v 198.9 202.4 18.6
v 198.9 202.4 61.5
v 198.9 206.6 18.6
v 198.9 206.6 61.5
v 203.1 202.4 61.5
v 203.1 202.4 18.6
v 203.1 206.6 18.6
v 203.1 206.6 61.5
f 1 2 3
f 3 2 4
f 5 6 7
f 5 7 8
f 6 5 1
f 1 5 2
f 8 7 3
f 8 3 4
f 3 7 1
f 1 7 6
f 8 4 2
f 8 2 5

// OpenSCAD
// Generated by the canonical parent Python sources and validated exchange pipeline.
polyhedron(points=[[198.89999389648438, 202.39999389648438, 18.600000381469727], [198.89999389648438, 202.39999389648438, 61.5], [198.89999389648438, 206.60000610351562, 18.600000381469727], [198.89999389648438, 206.60000610351562, 61.5], [203.10000610351562, 202.39999389648438, 61.5], [203.10000610351562, 202.39999389648438, 18.600000381469727], [203.10000610351562, 206.60000610351562, 18.600000381469727], [203.10000610351562, 206.60000610351562, 61.5]],faces=[[2, 1, 0], [3, 1, 2], [6, 5, 4], [7, 6, 4], [0, 4, 5], [1, 4, 0], [2, 6, 7], [3, 2, 7], [0, 6, 2], [5, 6, 0], [1, 3, 7], [4, 1, 7]],convexity=10);
